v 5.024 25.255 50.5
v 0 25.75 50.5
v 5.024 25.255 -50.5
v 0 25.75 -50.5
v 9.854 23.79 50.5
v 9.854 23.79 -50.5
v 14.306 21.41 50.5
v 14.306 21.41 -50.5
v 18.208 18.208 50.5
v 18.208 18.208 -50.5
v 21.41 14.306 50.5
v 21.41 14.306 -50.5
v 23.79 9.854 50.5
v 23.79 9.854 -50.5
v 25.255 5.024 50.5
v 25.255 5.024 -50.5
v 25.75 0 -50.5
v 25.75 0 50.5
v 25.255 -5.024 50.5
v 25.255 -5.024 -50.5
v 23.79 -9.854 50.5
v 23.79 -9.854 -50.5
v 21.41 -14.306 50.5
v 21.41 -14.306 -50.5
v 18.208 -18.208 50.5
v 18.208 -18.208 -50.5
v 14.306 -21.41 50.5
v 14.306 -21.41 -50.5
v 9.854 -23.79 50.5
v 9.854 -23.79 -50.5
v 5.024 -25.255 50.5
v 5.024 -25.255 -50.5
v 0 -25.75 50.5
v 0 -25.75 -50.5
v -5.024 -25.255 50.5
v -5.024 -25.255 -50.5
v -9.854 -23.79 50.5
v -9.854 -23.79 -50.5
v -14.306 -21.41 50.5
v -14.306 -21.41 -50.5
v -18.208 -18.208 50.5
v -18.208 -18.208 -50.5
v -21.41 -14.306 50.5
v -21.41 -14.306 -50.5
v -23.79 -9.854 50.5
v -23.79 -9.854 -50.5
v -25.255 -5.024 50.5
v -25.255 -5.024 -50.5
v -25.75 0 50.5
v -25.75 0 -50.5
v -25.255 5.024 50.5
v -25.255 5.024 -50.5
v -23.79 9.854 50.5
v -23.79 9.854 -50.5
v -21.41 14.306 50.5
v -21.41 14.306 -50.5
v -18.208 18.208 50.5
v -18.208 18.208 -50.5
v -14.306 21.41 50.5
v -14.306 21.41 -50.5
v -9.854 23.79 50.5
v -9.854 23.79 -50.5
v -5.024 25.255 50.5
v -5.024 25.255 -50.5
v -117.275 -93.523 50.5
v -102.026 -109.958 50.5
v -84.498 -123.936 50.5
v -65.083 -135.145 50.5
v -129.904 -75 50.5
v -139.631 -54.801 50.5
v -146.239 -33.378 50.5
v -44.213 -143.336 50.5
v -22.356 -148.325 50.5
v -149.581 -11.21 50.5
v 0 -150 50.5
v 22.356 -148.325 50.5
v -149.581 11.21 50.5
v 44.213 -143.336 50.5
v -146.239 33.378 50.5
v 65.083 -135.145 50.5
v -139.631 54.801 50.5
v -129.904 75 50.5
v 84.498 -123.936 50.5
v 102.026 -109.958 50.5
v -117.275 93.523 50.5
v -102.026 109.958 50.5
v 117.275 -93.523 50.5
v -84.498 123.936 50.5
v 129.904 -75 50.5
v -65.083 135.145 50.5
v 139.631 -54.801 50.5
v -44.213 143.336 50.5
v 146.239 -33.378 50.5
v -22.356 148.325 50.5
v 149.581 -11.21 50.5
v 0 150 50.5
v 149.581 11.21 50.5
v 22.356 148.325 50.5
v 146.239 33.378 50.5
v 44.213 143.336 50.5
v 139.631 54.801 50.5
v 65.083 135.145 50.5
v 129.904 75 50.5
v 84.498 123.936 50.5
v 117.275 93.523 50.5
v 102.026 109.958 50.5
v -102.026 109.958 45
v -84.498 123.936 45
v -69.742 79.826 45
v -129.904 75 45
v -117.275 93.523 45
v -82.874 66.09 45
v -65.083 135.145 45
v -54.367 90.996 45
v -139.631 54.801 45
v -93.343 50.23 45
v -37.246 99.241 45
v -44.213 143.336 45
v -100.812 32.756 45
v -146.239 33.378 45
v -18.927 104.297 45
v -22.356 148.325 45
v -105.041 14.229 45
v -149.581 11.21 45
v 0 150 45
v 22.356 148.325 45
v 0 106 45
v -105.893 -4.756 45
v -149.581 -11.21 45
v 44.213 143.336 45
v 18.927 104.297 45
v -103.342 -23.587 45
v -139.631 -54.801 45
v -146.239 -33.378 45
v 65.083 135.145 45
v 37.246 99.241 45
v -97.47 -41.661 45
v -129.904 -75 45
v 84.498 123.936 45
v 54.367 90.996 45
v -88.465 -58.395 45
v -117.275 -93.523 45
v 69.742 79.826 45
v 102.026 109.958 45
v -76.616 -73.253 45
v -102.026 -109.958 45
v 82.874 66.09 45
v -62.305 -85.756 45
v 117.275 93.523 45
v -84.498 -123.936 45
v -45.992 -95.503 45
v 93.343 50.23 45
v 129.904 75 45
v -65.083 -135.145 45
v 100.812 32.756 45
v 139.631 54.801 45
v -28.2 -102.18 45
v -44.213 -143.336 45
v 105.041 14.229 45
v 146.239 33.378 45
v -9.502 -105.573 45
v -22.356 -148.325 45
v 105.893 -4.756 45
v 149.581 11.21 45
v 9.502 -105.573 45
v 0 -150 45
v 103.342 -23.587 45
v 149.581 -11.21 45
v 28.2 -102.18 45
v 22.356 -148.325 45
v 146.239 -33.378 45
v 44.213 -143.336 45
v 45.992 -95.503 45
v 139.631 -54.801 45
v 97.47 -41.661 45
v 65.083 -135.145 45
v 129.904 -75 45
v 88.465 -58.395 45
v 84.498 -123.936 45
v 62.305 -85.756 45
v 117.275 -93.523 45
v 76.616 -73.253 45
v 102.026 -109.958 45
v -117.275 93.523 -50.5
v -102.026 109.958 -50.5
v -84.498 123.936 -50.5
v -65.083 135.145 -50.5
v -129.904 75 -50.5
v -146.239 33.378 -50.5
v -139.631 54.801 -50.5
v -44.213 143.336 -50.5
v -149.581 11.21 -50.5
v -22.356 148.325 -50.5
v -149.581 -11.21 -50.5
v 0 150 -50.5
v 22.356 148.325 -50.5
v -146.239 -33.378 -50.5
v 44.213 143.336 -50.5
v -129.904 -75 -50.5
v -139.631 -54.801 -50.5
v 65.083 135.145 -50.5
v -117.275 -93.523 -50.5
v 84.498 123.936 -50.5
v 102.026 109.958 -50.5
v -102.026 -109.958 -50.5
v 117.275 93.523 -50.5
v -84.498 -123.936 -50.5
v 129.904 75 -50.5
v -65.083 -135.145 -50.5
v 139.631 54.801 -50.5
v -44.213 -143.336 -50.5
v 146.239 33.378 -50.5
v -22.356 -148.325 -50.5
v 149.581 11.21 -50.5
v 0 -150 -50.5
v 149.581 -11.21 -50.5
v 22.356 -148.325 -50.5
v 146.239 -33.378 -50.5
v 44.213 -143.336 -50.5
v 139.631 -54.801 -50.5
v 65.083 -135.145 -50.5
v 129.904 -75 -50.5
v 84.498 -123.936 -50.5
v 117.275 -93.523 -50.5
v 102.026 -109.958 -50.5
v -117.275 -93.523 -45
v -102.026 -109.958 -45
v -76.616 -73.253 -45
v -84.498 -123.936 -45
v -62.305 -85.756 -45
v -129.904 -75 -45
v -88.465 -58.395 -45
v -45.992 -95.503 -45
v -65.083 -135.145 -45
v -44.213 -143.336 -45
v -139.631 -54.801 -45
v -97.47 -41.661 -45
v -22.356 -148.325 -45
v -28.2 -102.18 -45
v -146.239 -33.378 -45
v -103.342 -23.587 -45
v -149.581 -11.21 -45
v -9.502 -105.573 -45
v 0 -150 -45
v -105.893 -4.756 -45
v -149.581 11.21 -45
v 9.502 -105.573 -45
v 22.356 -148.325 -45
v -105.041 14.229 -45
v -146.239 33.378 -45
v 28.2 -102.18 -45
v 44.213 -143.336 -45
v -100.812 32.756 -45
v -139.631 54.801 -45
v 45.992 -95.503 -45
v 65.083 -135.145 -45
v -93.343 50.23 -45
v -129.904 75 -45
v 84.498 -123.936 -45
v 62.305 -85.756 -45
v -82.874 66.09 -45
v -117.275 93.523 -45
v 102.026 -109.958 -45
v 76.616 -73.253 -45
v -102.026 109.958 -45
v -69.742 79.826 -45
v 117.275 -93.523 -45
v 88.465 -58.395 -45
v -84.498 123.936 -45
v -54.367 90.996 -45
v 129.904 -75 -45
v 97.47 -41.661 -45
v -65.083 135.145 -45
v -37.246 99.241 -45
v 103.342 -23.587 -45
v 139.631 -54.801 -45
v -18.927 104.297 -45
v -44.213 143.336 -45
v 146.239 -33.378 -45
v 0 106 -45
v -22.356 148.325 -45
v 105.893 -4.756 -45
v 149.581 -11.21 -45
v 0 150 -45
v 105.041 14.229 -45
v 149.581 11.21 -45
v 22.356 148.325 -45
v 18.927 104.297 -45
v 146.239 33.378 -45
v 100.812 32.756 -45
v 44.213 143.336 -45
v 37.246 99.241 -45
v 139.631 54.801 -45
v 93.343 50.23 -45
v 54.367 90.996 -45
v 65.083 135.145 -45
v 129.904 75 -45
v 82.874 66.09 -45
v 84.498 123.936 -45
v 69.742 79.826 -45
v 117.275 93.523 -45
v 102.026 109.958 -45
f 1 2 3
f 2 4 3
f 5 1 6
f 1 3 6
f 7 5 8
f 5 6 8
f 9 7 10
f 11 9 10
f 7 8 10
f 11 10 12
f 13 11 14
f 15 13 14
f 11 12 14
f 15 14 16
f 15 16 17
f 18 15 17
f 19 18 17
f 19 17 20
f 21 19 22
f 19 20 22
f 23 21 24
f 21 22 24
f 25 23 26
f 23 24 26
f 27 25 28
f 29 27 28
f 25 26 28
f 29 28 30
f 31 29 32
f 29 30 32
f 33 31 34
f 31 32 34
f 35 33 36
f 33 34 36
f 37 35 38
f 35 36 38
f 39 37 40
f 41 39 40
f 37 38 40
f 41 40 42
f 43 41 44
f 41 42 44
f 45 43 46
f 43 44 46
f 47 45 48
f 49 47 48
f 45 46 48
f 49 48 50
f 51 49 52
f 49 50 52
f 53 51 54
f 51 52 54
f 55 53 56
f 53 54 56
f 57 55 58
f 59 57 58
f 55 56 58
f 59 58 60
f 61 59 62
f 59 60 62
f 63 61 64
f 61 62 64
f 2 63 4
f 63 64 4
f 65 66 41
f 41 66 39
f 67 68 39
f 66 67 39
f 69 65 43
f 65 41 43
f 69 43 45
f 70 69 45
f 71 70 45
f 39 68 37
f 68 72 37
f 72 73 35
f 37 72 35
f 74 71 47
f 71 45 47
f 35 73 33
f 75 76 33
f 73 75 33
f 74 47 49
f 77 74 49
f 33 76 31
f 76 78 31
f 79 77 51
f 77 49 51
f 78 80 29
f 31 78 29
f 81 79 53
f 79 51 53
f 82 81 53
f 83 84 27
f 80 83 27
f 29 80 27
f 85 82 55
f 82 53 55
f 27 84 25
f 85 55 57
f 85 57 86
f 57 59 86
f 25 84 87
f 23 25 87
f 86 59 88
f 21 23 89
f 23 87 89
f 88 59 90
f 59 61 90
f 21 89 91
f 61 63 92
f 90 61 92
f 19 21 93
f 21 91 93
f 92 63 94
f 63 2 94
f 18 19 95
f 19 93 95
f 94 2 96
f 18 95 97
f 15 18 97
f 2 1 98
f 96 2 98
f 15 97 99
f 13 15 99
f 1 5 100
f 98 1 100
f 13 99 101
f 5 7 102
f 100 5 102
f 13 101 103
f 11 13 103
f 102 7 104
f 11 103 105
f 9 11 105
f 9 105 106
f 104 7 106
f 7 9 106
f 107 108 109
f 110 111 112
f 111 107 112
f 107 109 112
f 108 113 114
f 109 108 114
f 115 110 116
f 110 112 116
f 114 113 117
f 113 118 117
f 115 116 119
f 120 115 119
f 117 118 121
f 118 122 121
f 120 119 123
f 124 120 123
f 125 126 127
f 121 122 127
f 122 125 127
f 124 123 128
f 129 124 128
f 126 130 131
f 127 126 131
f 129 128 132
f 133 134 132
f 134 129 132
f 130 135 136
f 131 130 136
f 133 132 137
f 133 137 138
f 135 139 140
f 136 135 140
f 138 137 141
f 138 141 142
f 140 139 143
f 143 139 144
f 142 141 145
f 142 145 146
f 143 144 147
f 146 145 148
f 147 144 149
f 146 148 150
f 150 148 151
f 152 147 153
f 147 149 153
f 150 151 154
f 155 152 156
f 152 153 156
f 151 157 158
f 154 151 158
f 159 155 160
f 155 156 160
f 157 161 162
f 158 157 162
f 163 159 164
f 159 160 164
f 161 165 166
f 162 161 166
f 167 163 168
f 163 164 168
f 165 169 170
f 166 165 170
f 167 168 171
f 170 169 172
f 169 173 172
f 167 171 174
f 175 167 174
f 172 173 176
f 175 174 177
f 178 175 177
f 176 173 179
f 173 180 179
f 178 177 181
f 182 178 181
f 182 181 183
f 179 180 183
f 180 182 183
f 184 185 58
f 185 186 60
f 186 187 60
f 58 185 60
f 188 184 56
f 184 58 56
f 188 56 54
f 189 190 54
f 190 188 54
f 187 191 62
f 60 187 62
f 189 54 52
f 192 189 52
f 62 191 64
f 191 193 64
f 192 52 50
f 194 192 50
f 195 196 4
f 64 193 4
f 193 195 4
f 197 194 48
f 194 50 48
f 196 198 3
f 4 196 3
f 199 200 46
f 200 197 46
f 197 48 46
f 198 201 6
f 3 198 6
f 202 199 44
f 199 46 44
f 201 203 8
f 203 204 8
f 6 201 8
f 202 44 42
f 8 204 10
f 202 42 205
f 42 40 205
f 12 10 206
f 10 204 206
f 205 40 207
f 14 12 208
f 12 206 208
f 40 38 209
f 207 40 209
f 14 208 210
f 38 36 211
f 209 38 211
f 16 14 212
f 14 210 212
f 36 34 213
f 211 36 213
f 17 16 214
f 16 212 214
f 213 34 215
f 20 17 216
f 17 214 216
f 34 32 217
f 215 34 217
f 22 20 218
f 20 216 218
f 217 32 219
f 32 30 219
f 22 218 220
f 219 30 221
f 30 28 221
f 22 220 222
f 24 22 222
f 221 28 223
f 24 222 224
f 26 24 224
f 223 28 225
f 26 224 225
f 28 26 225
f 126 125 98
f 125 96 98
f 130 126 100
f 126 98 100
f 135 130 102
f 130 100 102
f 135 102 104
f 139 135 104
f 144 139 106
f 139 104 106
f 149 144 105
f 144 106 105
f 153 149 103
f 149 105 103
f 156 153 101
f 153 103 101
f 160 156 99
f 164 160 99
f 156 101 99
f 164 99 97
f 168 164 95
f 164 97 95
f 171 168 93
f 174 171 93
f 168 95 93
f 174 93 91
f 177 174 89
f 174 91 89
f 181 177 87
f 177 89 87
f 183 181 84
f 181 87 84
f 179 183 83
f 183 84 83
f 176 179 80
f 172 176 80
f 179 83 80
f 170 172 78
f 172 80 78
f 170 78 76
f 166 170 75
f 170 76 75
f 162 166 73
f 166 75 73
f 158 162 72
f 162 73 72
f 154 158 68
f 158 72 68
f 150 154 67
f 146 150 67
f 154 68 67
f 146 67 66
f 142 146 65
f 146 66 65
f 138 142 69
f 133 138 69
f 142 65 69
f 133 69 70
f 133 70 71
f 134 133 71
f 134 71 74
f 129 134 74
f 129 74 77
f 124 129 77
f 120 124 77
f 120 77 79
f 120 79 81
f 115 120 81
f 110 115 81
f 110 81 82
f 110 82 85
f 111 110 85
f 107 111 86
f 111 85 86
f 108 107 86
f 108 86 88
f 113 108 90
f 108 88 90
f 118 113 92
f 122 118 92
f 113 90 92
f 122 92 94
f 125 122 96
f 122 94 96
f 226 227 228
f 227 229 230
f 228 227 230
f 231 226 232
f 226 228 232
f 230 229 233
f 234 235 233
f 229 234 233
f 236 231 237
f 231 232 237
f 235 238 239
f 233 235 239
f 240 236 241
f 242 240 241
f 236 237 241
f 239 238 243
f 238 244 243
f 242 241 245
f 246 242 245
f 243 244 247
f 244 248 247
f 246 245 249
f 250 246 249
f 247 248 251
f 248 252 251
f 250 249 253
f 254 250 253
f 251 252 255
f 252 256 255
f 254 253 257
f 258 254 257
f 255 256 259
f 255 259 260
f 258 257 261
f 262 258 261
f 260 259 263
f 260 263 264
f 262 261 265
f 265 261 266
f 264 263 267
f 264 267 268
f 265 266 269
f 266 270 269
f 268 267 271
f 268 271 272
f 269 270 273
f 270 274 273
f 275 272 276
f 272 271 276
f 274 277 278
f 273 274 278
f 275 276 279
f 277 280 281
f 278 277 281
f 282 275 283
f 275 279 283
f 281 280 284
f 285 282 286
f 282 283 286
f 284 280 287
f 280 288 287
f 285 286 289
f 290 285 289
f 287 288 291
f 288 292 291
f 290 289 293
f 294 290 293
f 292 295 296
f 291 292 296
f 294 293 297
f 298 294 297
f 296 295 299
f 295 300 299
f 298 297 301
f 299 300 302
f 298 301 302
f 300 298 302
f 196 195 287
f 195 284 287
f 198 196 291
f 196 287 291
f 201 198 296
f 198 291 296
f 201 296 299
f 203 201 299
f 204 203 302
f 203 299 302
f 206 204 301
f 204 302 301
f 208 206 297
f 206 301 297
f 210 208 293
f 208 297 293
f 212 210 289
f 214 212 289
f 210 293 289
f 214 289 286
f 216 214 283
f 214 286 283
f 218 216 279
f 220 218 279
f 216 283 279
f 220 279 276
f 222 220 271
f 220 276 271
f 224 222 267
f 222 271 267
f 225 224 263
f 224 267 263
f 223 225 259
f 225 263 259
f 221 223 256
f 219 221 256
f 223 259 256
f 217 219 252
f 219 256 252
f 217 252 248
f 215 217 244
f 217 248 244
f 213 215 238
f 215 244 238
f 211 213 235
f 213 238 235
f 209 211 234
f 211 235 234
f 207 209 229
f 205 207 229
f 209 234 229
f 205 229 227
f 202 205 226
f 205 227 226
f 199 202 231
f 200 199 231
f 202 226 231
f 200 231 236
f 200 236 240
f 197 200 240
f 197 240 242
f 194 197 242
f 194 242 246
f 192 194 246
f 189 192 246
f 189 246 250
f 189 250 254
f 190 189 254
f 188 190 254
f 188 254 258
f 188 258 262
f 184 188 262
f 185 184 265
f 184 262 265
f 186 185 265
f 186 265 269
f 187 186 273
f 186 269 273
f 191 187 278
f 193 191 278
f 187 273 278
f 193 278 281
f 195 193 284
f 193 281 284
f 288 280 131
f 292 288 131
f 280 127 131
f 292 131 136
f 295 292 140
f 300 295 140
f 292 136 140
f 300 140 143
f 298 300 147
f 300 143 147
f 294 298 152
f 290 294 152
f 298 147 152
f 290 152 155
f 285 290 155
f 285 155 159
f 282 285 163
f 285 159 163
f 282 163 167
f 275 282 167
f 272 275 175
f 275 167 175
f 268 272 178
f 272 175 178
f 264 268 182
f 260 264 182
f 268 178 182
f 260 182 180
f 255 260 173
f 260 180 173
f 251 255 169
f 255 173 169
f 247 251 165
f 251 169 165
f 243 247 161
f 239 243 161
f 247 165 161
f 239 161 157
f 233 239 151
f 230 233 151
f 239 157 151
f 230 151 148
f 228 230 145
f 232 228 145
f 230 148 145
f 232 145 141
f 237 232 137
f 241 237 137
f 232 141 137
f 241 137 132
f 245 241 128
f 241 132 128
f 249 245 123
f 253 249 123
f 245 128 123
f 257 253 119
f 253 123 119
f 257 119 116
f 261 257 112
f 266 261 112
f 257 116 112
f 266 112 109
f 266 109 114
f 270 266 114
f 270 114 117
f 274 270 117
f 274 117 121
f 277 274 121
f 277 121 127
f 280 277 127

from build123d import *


with BuildPart() as part:
    # Croquis1 one side → Revolución1 (revolve)
    with BuildSketch(Plane(origin=(0, 0, 0), x_dir=(0, 0, -1), z_dir=(1, 0, 0))):
        Polygon((-45, 106), (-45, 150), (-50.5, 150), (-50.5, 25.75), (50.5, 25.75), (50.5, 150), (45, 150), (45, 106), align=None)
    revolve(axis=Axis((0, 0, 50.5), (0, 0, -1)))


solid = part.part
